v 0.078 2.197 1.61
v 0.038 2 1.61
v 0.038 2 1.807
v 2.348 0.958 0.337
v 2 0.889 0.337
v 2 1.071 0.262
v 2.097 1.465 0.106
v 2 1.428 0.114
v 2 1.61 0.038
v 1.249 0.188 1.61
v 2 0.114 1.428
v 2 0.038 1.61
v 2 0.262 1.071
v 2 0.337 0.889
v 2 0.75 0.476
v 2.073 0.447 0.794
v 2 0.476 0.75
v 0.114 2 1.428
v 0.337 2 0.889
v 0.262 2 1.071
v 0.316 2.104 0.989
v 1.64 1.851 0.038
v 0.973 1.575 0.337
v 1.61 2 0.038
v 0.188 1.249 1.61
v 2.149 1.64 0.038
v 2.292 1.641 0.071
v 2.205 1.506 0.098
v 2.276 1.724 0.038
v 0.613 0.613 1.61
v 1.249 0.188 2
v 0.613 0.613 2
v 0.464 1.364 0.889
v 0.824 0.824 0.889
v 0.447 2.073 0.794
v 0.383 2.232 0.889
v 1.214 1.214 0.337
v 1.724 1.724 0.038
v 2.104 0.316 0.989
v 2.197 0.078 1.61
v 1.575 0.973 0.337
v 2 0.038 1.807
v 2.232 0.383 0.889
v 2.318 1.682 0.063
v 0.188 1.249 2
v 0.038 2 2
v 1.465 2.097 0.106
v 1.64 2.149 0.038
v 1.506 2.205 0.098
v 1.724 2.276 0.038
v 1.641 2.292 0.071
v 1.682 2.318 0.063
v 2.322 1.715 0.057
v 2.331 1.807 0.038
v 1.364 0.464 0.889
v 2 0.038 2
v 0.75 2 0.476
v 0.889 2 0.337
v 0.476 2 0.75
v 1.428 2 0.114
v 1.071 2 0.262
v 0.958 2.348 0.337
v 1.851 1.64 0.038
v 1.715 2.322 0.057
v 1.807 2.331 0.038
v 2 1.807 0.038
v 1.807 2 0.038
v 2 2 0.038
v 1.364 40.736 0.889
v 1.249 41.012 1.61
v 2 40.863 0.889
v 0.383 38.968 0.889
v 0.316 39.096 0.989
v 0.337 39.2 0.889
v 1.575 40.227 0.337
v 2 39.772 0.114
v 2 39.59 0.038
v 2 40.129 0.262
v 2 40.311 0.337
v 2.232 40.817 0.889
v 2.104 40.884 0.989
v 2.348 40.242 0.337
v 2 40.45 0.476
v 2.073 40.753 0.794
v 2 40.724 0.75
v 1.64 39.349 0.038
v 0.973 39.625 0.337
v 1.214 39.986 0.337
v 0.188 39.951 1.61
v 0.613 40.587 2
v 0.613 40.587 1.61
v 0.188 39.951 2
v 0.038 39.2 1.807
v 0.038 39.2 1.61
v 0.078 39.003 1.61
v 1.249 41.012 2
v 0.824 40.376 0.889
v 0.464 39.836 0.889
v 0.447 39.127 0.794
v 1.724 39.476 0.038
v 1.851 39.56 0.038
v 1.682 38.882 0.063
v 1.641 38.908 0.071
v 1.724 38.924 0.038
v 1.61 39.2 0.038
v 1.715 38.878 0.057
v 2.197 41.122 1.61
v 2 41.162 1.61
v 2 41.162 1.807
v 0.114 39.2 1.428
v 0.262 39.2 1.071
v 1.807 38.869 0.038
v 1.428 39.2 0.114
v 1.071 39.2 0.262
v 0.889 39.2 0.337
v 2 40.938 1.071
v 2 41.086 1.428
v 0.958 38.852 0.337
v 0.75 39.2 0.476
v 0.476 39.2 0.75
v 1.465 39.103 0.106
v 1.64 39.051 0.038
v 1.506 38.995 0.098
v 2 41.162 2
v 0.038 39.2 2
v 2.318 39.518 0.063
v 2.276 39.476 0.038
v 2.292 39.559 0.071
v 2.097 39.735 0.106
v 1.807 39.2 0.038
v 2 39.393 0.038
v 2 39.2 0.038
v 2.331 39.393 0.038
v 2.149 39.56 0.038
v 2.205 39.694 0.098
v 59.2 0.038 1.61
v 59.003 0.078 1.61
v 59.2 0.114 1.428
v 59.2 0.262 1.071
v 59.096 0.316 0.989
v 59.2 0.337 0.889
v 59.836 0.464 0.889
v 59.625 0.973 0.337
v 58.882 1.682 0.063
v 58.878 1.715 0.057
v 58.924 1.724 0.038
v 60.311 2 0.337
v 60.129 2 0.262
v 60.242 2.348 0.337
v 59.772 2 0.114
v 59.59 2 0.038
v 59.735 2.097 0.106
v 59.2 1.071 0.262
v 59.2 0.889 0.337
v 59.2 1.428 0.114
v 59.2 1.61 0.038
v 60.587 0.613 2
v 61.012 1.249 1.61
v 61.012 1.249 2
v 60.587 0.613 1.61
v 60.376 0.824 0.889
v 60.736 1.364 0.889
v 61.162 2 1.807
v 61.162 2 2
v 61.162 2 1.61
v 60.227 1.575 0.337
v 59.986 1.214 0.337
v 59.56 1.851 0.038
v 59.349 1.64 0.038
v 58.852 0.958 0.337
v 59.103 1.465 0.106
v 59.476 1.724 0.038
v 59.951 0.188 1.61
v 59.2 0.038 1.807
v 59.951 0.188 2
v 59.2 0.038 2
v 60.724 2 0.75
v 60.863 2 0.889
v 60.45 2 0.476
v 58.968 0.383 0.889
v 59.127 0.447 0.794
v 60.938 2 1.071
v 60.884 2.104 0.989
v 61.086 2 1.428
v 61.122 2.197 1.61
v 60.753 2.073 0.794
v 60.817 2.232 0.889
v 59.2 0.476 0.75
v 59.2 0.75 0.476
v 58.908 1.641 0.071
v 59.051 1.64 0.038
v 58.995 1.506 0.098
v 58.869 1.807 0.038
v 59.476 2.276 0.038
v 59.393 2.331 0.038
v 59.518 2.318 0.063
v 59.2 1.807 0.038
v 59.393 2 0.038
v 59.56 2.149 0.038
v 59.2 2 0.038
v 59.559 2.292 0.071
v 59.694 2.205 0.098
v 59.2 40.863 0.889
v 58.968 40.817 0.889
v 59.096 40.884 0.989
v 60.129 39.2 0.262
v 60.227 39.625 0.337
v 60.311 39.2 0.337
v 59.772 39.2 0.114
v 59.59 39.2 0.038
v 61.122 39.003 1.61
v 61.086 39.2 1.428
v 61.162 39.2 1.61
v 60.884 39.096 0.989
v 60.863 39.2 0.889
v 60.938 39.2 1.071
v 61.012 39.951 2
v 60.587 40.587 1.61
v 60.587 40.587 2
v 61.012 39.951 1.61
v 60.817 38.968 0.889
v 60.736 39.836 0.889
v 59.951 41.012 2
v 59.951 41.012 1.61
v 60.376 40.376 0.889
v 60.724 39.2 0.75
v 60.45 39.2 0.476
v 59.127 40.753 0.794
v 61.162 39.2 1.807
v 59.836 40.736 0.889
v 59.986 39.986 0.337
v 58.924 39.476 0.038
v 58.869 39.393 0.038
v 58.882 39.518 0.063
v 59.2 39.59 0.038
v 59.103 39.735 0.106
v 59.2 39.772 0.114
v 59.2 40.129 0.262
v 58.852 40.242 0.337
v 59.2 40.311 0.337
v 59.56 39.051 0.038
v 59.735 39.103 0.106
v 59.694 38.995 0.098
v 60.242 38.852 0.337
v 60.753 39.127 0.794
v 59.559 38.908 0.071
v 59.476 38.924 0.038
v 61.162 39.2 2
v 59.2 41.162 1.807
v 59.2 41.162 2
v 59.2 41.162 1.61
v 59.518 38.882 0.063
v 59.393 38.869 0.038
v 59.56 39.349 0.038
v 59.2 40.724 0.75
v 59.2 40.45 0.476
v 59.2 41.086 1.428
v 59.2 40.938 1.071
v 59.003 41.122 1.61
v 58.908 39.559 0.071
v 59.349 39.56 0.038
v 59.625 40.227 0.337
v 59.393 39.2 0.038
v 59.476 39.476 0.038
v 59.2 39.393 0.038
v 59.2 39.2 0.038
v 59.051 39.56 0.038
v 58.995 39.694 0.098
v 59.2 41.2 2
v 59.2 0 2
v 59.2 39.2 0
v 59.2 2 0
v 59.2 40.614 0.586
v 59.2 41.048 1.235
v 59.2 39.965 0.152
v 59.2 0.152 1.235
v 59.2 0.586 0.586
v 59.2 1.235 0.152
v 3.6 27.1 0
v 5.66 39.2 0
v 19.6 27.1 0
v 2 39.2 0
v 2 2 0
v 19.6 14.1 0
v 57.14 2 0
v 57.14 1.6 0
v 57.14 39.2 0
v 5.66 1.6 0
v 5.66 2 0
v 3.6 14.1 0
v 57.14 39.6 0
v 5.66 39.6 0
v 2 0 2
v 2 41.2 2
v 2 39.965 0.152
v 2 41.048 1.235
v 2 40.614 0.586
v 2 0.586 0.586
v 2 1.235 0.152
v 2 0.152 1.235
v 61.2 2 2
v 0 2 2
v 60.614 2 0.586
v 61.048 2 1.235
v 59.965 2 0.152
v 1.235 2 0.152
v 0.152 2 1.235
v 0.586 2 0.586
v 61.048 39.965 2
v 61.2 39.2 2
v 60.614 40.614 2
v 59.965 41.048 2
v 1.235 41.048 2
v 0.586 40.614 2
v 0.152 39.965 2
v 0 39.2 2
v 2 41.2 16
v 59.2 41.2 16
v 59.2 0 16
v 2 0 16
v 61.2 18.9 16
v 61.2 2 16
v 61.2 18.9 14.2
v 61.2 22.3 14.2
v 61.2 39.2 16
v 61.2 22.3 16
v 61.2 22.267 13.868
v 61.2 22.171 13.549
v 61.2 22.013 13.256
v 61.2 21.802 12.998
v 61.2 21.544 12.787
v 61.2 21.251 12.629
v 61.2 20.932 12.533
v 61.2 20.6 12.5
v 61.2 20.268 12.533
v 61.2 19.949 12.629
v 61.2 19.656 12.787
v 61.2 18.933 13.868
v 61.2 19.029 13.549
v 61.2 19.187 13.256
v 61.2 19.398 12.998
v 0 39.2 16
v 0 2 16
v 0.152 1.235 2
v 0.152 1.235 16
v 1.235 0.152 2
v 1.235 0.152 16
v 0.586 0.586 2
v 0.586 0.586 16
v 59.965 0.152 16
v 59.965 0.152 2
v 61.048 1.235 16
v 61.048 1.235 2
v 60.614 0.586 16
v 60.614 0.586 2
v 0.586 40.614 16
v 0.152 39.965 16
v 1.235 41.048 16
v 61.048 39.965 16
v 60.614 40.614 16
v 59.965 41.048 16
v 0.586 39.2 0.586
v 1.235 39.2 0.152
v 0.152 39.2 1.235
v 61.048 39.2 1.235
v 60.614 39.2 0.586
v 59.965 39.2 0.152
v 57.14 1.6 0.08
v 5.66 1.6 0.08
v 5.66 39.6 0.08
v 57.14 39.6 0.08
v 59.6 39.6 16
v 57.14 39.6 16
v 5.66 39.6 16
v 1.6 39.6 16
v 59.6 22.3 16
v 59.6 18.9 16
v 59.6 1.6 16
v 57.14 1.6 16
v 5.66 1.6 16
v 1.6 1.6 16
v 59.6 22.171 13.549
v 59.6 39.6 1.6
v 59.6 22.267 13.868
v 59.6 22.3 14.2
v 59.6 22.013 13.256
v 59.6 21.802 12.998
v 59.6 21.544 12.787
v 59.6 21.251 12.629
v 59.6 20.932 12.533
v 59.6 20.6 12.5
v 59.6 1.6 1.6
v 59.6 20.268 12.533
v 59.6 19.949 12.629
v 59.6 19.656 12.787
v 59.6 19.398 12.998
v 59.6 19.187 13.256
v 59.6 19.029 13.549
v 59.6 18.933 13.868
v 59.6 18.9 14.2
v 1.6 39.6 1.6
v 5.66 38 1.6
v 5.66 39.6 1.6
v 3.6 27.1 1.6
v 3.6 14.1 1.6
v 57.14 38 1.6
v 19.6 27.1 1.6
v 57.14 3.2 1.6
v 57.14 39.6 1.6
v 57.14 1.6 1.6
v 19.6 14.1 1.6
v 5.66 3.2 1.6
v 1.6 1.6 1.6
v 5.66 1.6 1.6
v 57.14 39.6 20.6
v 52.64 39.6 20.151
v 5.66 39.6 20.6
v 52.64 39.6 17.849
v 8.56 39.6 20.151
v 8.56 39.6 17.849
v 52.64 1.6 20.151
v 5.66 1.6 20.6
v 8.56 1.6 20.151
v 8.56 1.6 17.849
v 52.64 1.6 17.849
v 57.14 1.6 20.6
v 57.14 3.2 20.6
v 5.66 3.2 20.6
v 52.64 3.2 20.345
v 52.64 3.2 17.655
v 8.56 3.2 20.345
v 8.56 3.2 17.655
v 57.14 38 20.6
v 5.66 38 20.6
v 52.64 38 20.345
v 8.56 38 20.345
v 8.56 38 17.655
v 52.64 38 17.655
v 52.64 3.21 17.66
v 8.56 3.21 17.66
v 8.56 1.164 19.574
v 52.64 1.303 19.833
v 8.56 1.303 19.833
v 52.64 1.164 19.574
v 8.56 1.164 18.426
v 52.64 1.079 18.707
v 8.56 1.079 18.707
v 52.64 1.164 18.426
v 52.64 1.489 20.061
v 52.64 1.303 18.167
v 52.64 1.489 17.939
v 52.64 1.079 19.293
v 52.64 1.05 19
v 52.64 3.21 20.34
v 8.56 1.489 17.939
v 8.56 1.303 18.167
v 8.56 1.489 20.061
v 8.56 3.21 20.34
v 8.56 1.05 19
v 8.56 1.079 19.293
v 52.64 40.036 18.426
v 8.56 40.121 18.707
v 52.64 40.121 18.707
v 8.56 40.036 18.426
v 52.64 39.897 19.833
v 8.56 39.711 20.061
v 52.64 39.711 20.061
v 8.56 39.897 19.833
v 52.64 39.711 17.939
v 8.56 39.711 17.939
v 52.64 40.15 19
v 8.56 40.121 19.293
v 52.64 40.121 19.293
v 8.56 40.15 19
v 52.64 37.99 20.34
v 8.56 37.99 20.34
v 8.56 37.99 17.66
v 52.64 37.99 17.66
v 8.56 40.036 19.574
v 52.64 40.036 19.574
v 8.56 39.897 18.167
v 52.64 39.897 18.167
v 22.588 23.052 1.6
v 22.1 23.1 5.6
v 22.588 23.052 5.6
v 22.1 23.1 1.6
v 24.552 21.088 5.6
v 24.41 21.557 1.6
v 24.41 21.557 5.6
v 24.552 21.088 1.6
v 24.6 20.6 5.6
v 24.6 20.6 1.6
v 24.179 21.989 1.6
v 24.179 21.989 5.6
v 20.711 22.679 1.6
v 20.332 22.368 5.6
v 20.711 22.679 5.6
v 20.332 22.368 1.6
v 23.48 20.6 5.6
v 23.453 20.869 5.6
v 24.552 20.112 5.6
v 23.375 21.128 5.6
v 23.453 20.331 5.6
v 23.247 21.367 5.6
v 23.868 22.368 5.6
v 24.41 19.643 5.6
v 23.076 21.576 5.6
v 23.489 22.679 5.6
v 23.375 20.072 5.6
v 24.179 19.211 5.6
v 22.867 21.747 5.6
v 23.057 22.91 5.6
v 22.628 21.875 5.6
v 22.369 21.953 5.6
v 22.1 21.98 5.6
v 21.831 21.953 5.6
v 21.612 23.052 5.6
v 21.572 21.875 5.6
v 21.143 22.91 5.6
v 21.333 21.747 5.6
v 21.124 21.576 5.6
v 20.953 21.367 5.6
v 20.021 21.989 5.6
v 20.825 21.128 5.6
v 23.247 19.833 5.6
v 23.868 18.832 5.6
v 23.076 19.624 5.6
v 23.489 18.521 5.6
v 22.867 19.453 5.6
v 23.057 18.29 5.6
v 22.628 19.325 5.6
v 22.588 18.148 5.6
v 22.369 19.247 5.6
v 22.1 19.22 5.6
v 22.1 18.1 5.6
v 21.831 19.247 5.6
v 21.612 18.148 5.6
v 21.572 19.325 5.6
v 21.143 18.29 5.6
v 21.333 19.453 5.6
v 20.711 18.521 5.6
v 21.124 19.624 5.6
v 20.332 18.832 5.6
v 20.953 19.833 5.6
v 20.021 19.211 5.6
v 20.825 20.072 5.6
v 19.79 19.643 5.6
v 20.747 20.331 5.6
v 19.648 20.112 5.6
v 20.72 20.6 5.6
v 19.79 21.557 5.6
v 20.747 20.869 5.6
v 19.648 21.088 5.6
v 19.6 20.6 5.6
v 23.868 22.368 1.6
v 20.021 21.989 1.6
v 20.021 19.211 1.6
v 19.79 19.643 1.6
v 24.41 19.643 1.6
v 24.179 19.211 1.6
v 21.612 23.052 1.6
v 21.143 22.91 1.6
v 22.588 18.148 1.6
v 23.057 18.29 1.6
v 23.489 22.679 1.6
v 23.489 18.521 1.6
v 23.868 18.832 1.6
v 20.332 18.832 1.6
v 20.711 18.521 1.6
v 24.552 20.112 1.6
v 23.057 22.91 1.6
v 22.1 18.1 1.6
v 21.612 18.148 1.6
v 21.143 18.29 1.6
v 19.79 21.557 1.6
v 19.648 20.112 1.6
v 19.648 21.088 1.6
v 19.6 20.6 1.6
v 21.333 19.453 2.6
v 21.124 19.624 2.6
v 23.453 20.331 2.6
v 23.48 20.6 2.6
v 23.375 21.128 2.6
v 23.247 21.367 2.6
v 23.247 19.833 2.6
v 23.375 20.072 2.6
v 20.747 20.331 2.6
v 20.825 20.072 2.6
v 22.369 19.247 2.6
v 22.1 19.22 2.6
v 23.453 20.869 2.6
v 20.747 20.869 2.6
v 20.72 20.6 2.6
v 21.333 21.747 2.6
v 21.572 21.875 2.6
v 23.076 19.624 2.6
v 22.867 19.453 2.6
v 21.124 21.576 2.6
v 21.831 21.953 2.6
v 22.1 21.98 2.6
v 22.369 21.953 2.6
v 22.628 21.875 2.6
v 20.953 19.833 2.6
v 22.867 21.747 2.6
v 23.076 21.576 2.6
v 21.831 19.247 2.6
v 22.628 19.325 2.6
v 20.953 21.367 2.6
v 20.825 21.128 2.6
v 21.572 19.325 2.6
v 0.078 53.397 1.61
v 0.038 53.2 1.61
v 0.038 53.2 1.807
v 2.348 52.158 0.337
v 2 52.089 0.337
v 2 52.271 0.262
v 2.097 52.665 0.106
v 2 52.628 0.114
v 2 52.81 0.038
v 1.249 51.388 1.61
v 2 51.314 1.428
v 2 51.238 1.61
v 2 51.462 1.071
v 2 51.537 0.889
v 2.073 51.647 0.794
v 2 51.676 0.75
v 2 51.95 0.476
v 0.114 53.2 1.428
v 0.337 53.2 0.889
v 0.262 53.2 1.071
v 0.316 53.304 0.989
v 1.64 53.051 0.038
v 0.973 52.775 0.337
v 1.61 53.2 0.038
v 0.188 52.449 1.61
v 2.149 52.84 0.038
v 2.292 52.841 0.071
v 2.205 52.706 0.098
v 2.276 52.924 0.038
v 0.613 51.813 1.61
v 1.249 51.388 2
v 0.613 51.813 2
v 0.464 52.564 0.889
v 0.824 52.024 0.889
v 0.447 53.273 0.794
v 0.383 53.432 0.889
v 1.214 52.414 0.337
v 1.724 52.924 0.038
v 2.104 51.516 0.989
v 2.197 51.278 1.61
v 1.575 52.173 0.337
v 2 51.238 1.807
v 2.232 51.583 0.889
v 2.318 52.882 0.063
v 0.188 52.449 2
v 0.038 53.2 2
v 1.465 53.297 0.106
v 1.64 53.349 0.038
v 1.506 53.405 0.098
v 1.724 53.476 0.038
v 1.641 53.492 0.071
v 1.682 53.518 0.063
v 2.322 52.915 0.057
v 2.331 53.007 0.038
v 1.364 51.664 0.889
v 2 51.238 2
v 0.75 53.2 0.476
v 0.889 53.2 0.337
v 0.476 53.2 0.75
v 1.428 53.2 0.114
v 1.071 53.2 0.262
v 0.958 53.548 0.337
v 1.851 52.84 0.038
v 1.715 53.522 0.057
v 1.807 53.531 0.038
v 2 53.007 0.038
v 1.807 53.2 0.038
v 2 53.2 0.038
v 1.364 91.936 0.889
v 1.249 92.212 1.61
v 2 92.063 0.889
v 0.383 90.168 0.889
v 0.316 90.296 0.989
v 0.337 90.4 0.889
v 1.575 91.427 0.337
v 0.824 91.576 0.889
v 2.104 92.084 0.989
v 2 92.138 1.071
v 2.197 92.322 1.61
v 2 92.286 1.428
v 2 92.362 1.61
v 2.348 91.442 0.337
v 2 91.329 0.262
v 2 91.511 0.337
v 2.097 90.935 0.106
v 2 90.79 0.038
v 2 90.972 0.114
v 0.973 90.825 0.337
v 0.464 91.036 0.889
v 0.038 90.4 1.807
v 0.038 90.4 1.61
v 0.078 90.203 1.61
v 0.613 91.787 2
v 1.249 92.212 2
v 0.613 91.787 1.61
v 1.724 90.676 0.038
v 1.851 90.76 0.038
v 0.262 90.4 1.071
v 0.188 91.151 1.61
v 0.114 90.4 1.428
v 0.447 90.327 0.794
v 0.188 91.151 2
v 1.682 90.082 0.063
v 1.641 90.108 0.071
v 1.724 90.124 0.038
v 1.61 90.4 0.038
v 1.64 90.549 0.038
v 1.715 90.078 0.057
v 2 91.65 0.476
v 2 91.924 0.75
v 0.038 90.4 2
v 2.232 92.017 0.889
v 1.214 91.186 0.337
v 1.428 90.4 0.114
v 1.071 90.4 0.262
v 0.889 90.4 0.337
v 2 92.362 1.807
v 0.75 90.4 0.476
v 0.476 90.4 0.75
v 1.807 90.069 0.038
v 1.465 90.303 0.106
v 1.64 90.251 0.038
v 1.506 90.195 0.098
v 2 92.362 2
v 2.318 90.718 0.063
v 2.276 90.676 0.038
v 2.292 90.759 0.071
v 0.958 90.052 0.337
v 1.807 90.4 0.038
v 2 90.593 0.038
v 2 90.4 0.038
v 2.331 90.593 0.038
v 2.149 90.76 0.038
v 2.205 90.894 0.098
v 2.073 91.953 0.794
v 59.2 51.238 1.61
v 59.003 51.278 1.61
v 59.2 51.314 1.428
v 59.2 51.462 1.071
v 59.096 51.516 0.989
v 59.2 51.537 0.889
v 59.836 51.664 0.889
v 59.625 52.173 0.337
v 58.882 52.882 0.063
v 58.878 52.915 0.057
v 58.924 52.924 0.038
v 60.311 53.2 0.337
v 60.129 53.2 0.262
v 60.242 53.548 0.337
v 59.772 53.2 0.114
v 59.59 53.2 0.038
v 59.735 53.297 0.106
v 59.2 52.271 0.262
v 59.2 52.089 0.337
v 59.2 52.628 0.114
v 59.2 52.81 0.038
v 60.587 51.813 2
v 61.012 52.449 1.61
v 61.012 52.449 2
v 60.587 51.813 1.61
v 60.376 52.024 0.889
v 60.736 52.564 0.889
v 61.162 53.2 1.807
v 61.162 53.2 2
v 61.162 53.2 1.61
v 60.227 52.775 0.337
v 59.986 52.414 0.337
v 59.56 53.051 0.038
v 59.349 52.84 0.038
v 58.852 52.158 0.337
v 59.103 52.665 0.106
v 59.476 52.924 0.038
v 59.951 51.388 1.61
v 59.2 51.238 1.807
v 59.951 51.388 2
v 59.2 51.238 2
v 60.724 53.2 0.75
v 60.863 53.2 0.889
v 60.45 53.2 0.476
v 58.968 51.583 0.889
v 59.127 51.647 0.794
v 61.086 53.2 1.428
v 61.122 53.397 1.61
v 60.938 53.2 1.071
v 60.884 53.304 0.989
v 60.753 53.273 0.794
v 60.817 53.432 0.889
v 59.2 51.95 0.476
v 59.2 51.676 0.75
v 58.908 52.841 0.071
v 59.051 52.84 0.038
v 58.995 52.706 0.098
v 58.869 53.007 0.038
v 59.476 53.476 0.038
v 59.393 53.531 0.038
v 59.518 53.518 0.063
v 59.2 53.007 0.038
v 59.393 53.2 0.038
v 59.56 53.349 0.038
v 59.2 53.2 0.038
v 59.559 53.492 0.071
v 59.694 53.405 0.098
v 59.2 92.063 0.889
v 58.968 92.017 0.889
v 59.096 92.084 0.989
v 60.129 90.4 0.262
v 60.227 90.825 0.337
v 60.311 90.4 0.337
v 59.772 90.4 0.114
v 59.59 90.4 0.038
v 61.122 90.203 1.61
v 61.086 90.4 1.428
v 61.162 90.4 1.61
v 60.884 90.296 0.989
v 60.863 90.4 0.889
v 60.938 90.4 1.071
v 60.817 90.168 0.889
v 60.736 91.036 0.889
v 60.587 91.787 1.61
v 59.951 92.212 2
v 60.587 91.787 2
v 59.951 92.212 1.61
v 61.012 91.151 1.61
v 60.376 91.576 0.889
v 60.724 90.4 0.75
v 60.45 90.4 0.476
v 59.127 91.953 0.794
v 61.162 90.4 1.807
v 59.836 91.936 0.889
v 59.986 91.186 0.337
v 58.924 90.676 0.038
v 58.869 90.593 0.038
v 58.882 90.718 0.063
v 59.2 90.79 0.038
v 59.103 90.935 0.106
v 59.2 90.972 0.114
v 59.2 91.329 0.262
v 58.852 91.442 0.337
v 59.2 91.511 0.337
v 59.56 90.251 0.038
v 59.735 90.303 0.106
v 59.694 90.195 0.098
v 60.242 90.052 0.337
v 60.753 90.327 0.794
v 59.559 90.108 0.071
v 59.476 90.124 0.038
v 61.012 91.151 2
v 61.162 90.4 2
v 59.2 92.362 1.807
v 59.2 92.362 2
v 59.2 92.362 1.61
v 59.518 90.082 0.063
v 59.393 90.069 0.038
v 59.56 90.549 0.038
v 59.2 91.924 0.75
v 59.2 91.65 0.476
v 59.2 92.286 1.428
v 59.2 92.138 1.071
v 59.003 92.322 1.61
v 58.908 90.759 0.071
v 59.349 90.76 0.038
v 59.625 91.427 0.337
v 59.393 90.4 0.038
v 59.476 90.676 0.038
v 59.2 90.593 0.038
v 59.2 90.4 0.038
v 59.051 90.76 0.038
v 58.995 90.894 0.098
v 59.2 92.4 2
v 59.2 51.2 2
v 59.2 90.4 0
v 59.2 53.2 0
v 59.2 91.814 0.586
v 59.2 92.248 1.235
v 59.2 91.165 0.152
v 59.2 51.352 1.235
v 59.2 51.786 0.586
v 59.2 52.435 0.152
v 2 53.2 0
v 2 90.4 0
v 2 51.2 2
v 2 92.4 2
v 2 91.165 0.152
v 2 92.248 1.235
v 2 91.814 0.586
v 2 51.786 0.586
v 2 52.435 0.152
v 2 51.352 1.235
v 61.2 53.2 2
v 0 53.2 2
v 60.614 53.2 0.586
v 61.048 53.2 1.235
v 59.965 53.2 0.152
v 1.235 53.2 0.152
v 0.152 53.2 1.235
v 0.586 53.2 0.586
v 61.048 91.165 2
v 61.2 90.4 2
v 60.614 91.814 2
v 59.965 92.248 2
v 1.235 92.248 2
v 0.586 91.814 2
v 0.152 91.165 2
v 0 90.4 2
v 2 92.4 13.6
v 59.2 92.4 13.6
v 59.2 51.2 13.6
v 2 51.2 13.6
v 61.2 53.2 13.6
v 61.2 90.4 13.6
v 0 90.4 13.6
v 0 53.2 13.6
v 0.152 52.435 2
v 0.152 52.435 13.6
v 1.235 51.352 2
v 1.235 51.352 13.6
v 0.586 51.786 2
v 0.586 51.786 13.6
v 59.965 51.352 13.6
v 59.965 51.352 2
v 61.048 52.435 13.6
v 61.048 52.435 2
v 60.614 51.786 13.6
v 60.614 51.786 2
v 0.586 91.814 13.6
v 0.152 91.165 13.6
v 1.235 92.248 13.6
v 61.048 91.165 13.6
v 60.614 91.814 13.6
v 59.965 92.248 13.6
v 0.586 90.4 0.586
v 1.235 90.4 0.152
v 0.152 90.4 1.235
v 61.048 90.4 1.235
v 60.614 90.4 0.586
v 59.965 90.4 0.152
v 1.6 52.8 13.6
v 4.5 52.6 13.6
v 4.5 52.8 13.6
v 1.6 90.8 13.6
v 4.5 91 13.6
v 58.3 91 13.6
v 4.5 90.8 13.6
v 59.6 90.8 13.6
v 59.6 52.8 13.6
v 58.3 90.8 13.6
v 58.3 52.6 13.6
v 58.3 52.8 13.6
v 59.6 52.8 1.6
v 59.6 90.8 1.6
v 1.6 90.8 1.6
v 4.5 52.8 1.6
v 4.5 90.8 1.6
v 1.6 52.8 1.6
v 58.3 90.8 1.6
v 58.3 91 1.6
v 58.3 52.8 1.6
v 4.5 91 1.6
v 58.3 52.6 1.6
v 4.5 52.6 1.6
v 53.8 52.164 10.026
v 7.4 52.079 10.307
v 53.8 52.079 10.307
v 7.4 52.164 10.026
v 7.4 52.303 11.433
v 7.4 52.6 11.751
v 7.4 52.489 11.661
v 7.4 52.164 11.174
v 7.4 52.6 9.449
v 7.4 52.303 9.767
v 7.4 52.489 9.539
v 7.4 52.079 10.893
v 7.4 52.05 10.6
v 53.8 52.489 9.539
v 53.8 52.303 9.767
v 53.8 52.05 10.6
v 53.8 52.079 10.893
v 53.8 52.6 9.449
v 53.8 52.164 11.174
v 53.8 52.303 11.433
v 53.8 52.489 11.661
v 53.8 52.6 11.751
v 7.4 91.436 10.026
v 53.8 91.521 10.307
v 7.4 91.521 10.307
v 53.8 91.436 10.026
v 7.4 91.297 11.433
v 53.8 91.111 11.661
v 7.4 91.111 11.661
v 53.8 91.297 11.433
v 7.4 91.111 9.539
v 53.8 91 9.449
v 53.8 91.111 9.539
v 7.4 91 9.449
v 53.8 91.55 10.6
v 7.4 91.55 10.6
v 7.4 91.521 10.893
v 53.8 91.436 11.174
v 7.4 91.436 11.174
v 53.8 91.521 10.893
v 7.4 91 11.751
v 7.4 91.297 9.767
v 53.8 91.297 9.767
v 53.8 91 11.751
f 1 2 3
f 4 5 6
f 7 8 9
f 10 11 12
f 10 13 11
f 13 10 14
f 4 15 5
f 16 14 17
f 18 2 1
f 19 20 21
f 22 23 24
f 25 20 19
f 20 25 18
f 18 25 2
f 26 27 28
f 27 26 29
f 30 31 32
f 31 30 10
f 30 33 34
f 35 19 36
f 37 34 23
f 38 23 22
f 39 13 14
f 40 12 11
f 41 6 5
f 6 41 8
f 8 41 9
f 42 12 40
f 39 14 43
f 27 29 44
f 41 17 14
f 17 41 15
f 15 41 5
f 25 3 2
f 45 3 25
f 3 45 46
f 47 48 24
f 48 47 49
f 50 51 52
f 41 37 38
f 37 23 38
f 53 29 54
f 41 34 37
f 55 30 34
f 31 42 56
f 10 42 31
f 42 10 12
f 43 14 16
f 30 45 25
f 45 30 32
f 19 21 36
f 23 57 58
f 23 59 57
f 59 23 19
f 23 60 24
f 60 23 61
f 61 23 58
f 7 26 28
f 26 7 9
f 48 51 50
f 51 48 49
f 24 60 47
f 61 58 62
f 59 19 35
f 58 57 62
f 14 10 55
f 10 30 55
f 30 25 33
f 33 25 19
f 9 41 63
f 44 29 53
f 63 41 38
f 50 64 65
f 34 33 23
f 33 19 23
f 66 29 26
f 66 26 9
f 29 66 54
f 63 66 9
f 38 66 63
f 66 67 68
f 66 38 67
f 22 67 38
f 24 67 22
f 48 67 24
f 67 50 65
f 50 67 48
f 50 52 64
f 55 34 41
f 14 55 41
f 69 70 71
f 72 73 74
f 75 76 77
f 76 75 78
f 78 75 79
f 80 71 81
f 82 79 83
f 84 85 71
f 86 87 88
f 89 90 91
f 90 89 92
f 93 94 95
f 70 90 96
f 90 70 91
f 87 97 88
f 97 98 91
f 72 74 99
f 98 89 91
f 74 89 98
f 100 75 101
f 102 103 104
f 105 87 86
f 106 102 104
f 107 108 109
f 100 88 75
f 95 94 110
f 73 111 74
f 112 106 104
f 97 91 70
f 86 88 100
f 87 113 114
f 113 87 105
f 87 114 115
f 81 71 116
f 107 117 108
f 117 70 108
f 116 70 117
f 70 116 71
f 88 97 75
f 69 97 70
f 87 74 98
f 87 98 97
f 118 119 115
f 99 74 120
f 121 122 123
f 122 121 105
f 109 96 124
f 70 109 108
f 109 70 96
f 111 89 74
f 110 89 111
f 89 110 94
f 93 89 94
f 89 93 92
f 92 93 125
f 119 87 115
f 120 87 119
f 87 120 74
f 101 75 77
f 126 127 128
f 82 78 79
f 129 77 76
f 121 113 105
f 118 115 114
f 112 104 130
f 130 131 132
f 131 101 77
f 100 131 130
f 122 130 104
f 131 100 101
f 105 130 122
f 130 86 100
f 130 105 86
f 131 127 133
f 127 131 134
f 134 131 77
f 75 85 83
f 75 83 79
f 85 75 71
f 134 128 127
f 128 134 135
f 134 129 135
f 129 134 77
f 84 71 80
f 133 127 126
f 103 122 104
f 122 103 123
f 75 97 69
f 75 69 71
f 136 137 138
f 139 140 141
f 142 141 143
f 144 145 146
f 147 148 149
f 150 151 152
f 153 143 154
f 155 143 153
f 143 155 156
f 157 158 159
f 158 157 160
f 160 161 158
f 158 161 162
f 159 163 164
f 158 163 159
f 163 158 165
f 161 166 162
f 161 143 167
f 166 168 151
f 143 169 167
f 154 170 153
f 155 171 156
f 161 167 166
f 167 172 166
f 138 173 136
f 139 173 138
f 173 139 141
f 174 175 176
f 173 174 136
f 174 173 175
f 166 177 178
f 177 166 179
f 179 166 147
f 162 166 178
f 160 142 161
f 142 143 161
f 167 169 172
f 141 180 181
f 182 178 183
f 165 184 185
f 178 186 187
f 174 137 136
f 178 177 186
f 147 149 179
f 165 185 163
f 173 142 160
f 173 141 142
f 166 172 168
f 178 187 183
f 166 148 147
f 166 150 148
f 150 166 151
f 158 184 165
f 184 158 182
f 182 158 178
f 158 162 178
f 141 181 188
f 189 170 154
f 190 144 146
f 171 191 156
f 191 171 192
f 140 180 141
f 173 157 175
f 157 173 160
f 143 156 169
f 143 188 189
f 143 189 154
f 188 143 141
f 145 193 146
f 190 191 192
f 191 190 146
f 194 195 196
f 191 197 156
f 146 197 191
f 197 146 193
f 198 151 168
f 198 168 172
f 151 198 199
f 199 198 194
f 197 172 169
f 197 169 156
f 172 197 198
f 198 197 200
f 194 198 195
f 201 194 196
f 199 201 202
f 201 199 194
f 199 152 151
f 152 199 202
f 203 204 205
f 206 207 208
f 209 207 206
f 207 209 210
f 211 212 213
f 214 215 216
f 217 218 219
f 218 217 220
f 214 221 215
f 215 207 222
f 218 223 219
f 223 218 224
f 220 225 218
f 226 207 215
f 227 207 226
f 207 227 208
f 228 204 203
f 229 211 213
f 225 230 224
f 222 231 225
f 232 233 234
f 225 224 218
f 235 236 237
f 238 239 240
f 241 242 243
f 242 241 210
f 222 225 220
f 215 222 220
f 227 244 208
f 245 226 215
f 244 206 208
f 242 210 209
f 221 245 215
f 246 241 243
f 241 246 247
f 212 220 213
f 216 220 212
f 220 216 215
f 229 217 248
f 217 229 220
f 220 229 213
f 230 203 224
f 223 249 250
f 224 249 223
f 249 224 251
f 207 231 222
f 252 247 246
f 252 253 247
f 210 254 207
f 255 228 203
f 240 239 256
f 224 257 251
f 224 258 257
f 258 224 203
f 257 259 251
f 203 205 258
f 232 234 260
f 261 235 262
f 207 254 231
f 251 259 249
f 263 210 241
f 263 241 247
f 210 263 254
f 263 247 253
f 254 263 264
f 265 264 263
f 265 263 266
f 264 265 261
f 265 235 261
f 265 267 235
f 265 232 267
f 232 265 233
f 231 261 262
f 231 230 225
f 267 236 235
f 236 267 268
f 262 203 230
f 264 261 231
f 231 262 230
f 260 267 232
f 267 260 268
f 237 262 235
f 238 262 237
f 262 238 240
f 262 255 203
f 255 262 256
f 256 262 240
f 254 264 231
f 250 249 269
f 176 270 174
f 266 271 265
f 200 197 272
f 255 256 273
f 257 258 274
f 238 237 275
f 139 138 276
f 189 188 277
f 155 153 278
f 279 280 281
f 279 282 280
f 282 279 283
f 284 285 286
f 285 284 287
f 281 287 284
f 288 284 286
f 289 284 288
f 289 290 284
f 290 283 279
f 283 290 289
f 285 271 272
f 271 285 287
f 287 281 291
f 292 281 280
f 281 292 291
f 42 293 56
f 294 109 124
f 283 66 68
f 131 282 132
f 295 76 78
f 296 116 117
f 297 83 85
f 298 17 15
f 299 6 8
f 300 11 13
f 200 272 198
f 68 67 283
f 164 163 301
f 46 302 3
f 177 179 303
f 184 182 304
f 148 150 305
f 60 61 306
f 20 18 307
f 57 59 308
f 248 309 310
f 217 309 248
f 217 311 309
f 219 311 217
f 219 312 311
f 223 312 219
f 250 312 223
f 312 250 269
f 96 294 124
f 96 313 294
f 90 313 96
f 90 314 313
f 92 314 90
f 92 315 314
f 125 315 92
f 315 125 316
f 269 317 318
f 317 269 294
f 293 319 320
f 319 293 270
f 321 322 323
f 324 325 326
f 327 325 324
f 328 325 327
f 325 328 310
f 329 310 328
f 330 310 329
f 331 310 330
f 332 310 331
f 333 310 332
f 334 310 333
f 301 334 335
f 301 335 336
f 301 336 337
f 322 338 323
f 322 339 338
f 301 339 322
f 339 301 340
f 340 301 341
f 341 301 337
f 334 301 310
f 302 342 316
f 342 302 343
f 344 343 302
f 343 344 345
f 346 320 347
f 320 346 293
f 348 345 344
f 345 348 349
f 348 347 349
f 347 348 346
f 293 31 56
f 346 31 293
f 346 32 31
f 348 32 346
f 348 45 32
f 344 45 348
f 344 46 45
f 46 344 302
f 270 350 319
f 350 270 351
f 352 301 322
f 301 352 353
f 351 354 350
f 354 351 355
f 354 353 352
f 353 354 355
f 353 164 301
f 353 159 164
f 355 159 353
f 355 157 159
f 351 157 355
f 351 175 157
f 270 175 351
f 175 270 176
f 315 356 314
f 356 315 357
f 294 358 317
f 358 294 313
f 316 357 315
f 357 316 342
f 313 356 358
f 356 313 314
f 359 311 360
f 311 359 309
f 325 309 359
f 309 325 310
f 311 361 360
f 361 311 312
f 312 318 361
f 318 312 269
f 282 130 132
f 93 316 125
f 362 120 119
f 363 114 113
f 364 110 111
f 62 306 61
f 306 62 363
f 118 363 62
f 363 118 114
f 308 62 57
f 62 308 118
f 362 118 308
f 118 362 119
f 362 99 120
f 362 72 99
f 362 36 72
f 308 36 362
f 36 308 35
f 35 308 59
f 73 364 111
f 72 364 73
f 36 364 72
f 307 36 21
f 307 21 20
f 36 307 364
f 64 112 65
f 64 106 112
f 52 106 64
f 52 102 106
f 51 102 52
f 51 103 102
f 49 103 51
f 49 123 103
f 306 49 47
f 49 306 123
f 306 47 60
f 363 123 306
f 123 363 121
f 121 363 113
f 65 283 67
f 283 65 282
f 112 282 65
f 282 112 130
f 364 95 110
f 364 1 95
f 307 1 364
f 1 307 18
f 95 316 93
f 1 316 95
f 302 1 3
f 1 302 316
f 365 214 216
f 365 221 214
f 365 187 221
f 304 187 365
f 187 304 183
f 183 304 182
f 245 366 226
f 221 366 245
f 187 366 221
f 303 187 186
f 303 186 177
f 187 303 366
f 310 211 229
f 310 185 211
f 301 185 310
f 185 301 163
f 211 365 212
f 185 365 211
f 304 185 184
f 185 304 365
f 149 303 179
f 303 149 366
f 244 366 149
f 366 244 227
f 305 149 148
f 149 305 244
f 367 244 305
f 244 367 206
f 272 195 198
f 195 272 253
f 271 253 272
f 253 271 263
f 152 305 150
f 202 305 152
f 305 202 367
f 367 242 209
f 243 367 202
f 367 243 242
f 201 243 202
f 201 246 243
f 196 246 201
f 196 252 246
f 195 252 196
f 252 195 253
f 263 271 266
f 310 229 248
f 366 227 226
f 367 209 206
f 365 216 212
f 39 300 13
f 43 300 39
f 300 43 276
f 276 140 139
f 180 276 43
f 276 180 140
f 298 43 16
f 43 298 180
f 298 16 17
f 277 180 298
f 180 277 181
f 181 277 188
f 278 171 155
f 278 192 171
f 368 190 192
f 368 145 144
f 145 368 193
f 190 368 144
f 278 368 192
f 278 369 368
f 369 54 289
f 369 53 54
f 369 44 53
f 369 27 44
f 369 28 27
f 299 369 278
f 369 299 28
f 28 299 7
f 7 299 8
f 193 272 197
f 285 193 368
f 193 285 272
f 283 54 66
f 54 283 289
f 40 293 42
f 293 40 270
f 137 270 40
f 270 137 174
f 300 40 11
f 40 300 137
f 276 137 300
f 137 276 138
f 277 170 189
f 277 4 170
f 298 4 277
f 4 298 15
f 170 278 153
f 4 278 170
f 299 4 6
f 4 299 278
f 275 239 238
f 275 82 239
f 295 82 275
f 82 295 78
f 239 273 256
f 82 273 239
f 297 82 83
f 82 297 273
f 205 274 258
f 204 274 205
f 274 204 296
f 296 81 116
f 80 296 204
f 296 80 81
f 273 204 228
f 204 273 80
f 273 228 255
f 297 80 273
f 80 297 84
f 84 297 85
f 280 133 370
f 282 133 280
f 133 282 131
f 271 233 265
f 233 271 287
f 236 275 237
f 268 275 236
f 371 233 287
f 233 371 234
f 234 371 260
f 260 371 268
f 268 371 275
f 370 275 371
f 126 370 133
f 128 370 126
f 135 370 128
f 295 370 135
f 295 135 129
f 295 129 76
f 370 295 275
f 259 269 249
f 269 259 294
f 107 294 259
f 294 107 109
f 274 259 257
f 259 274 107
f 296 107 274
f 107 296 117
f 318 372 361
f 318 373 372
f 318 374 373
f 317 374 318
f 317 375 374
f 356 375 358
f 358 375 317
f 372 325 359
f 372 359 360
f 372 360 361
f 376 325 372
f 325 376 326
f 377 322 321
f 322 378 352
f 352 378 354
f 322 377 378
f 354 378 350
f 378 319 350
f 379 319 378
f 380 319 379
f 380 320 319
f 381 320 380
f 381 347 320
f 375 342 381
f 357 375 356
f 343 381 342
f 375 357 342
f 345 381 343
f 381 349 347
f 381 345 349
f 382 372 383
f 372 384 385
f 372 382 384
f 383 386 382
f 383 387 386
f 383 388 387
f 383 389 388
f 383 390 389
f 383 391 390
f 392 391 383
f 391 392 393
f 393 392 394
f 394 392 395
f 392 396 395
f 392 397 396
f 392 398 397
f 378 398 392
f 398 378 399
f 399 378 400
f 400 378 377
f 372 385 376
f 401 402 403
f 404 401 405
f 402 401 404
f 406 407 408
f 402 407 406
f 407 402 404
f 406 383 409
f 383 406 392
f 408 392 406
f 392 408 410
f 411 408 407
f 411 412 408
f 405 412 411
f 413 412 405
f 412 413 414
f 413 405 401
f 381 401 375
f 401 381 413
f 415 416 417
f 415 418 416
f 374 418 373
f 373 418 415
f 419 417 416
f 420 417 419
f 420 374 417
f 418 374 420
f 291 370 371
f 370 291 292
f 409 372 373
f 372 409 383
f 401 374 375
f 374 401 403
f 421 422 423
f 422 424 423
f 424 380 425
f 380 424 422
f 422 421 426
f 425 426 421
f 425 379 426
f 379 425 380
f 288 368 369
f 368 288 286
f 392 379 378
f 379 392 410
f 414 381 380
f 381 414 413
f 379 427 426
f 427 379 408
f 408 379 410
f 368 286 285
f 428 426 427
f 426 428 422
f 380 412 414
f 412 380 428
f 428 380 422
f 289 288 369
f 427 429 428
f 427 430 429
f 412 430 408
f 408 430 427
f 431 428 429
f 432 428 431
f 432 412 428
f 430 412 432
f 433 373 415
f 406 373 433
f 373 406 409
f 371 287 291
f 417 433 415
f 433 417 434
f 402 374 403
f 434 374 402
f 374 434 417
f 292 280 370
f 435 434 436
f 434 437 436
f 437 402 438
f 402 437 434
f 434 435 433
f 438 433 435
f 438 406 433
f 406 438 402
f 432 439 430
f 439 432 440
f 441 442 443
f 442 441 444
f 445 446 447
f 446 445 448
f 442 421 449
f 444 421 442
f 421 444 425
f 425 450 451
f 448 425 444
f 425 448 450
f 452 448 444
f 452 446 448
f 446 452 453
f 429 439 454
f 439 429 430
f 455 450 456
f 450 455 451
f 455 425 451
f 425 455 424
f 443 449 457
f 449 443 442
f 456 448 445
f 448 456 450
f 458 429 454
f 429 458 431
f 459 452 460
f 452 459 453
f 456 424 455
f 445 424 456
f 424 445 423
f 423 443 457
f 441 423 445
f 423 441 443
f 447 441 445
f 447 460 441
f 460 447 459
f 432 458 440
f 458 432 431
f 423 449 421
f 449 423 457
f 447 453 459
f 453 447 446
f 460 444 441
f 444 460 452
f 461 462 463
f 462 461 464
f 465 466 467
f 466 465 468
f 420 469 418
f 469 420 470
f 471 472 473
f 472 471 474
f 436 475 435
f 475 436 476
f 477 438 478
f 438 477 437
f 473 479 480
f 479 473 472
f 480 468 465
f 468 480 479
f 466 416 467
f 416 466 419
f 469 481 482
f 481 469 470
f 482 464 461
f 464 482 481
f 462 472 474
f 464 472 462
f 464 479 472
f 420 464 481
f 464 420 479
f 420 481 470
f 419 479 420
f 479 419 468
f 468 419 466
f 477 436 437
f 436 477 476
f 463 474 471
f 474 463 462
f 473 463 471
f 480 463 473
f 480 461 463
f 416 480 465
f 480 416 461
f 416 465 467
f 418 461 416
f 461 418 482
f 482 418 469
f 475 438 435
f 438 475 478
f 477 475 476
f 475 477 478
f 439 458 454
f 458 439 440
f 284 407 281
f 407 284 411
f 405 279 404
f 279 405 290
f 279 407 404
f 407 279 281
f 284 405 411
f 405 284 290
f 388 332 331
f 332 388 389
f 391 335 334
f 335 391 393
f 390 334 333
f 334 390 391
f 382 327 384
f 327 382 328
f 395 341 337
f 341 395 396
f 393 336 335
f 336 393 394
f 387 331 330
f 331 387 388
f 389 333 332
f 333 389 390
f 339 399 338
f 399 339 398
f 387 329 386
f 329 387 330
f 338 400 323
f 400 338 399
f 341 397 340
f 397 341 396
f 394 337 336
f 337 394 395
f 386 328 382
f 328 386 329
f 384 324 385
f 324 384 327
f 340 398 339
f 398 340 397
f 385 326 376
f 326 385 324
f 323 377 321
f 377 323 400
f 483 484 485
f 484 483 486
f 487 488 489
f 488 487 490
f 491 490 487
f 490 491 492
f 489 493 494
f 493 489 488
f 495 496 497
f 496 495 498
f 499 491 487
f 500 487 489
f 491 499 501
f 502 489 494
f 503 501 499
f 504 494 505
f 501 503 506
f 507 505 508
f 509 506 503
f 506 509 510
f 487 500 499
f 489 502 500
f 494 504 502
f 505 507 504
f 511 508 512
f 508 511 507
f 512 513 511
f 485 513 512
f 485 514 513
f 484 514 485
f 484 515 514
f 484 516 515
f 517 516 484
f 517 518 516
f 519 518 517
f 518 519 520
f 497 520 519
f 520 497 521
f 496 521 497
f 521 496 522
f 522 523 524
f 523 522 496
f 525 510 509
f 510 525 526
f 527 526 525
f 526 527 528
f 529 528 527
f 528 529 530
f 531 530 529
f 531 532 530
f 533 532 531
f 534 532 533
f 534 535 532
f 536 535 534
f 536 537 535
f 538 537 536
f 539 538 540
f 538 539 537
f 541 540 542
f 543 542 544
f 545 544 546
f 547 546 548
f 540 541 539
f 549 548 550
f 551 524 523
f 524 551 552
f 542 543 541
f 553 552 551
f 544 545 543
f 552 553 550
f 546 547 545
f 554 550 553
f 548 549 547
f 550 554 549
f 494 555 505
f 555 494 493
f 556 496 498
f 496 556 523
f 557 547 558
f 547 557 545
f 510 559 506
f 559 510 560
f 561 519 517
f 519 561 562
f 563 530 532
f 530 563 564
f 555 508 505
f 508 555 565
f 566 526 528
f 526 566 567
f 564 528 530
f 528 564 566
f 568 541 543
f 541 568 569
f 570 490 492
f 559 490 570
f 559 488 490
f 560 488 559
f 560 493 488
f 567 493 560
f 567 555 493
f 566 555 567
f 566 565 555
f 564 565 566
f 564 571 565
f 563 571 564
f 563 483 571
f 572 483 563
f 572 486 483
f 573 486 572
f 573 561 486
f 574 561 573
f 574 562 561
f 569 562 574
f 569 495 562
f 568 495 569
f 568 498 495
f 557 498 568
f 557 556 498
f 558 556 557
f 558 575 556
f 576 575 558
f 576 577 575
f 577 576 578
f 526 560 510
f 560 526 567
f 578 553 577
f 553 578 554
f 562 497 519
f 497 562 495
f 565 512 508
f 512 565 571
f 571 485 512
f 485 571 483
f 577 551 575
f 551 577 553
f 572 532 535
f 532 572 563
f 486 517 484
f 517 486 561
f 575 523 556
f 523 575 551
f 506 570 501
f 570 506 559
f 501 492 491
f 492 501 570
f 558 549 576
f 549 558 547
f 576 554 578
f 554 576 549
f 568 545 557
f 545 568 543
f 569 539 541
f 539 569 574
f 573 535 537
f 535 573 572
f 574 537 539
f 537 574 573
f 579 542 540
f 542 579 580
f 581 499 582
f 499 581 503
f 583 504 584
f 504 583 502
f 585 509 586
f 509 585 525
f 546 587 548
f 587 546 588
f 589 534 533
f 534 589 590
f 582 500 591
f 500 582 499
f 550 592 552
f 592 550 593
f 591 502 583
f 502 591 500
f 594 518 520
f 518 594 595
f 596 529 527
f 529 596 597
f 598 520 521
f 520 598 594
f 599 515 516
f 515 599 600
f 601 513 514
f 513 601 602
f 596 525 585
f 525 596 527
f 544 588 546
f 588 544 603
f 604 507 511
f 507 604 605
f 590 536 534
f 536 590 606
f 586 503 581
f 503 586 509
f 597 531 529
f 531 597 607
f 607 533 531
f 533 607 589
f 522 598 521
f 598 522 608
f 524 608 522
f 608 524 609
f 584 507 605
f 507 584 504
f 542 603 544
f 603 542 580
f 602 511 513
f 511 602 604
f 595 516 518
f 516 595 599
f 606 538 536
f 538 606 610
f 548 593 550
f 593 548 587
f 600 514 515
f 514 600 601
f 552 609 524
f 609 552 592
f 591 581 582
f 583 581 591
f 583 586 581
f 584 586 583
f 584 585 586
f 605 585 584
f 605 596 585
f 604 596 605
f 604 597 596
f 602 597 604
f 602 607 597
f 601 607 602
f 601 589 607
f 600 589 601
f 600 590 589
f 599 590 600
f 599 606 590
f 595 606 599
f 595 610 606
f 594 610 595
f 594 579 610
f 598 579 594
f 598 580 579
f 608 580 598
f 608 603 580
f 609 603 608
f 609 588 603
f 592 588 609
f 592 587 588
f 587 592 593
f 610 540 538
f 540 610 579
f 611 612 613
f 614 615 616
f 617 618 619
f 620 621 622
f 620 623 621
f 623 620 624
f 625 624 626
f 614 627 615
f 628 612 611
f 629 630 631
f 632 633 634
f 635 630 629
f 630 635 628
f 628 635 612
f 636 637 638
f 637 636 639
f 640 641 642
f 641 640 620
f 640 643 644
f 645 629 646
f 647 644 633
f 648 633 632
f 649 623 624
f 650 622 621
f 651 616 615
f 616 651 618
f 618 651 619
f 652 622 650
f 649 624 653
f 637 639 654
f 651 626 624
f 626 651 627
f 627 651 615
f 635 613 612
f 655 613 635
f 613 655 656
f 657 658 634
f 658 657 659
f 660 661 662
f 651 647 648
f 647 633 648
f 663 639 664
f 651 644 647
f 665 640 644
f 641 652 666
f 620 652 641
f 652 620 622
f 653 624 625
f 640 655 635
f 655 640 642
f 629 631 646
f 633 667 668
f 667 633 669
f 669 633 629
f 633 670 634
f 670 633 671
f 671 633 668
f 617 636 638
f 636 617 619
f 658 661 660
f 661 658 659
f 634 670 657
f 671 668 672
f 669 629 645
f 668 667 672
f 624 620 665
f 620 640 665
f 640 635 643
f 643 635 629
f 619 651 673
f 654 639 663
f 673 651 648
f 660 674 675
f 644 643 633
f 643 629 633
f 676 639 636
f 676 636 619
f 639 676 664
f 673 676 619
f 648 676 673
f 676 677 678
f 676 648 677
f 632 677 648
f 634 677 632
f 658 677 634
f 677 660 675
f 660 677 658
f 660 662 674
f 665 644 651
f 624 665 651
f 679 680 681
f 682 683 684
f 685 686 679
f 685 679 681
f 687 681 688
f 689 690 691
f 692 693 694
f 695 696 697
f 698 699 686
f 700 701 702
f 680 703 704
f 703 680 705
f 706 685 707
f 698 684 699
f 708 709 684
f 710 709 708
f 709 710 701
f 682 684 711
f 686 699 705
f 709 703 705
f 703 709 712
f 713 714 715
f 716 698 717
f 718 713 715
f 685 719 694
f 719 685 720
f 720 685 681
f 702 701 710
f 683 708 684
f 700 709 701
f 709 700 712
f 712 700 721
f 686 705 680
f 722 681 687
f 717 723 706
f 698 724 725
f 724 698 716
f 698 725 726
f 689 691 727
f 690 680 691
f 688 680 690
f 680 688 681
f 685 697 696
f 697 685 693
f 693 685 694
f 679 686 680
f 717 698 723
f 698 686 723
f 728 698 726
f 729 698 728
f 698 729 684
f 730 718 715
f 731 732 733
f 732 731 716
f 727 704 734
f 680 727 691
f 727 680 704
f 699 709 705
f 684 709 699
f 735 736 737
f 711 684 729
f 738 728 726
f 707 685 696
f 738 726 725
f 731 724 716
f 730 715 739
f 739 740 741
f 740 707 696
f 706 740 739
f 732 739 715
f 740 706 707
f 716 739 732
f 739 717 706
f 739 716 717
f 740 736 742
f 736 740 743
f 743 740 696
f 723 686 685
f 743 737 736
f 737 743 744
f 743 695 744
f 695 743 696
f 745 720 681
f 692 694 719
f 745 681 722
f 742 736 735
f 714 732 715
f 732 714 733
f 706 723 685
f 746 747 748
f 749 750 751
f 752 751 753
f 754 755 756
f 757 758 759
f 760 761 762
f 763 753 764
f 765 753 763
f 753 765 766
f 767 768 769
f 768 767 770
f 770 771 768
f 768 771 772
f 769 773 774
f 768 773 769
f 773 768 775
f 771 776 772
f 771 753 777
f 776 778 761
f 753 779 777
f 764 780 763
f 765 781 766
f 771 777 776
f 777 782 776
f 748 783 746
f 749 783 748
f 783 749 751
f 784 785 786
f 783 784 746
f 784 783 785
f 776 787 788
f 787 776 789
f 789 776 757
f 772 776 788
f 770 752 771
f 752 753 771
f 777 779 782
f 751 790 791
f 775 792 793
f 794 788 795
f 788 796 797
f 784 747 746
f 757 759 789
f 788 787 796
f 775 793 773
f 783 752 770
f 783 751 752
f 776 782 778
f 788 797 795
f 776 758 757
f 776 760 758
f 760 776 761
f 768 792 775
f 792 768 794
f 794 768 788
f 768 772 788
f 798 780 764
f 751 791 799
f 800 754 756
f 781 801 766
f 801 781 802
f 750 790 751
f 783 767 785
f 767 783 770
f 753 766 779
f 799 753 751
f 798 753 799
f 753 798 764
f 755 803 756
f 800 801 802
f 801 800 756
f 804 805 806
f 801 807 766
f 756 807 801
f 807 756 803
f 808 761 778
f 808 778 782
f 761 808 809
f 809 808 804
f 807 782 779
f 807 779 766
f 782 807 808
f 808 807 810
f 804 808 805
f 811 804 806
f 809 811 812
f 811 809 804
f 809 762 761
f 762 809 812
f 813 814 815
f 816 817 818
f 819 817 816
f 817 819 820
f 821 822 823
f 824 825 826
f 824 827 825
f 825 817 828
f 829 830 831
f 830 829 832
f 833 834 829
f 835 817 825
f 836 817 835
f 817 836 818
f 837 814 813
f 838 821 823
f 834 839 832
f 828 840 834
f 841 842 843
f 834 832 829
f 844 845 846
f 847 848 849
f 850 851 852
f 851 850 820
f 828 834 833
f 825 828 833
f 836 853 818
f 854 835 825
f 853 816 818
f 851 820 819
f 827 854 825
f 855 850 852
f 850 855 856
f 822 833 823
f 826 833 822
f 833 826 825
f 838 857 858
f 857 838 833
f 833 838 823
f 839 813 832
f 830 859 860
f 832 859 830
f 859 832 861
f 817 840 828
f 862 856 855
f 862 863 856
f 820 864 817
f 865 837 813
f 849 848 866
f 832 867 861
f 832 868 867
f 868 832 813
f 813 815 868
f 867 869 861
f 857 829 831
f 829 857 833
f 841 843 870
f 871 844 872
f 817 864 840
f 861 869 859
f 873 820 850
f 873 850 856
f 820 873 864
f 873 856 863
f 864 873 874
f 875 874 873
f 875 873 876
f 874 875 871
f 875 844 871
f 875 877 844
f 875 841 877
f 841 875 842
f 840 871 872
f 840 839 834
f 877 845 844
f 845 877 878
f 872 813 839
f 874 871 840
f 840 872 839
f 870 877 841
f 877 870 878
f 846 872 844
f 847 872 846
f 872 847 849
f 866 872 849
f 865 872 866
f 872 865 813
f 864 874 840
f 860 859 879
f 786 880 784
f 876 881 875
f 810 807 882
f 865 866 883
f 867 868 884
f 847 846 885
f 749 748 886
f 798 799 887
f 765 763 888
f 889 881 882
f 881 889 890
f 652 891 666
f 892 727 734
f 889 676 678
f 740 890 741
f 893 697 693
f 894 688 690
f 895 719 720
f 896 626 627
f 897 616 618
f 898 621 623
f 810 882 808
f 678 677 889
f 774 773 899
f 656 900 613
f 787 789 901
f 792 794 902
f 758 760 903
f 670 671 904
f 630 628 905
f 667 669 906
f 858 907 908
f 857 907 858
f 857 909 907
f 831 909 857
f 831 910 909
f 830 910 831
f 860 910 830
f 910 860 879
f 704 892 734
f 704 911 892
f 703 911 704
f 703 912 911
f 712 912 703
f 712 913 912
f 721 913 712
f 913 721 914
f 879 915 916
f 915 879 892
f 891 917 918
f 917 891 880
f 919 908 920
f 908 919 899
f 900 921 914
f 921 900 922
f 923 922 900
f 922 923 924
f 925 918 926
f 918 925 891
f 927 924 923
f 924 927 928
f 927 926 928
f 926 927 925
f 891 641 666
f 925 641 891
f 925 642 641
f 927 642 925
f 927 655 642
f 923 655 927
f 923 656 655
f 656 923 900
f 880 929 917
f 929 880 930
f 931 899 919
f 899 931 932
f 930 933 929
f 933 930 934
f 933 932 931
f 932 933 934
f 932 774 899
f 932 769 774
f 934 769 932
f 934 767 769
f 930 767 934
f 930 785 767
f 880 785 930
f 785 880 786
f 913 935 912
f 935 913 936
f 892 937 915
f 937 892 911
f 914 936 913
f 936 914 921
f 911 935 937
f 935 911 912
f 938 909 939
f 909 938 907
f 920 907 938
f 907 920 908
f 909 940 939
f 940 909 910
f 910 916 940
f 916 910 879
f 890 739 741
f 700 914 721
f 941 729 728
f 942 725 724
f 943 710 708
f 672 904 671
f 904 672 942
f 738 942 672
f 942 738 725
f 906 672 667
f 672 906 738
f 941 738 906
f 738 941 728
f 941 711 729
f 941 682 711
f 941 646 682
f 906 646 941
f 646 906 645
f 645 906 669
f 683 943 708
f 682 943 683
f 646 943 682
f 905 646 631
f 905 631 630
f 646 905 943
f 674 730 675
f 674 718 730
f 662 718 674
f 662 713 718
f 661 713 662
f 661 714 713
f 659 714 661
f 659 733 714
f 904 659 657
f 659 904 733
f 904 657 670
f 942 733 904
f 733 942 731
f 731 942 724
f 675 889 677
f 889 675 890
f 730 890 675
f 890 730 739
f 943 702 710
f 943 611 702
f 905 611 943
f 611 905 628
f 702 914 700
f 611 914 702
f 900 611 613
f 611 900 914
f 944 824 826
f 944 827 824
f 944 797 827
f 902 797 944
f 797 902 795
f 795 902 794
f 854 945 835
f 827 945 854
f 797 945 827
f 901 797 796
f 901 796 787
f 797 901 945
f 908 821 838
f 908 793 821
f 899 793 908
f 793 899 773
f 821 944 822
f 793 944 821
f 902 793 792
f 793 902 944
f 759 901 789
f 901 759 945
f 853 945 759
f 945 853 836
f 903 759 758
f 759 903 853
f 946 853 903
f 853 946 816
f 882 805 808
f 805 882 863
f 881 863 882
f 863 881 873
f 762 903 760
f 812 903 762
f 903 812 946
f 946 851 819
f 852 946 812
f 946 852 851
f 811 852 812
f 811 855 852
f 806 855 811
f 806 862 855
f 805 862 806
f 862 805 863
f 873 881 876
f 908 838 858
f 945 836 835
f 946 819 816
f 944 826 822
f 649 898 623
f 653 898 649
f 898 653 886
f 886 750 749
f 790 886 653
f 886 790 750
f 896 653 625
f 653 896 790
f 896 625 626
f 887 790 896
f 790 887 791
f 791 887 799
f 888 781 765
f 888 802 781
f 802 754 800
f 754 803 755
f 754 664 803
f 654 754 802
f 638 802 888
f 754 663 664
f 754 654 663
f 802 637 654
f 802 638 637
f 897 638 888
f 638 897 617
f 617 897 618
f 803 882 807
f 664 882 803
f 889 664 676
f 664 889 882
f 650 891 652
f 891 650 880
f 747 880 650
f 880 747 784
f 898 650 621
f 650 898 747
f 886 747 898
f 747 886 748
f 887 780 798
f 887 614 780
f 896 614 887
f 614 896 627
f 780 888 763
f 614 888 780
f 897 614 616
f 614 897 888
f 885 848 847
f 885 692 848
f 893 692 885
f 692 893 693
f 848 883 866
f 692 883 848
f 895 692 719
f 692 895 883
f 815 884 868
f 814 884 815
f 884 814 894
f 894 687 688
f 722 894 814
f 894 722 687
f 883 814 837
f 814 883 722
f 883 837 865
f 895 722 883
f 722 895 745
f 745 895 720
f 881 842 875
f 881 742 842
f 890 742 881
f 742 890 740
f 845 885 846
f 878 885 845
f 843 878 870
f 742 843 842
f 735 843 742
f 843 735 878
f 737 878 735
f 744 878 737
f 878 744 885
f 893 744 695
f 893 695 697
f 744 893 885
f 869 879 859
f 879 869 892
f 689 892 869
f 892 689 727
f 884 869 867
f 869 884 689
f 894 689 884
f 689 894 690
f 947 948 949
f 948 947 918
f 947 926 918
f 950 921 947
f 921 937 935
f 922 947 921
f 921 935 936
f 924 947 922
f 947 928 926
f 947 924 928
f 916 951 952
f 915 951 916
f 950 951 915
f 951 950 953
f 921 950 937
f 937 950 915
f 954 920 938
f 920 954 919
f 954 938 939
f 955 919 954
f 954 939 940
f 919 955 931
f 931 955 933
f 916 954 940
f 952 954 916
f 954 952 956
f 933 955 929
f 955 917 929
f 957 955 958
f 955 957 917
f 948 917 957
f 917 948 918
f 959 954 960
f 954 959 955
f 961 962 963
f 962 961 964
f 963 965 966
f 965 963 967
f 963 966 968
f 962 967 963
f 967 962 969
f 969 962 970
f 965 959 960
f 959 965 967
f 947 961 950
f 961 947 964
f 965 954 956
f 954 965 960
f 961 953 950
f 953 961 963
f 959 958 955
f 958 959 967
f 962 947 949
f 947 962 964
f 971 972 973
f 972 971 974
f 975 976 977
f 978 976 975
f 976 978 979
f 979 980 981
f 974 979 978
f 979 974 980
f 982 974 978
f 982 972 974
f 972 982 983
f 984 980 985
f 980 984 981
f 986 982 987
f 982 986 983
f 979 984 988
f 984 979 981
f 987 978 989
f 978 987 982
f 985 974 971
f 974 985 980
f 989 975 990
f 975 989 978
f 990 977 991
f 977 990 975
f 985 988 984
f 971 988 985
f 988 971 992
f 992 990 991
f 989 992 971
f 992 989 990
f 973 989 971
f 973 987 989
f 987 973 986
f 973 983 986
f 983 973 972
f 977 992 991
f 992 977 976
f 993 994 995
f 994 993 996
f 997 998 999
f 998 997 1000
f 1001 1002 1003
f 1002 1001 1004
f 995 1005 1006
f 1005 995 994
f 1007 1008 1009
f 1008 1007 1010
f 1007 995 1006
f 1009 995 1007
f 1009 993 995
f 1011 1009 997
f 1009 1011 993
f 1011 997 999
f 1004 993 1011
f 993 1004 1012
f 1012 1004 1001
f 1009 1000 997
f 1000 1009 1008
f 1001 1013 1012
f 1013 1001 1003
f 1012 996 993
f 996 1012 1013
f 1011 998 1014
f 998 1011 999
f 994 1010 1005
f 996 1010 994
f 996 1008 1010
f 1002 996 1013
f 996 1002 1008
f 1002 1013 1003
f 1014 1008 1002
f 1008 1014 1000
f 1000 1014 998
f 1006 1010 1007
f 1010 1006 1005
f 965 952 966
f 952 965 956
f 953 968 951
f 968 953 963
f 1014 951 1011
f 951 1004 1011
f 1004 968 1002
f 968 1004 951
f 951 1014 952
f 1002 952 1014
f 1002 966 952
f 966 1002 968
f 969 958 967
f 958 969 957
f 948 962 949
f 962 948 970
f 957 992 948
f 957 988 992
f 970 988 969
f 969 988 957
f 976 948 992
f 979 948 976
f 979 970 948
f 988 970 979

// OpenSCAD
inner_dims = [58, 38];
sensor = [16,13];

wall = 1.6;
tabd = 3;
m3 = 2.76;
cord=3.4;


$fn=32;



top();
translate([0, inner_dims.y+wall*2+10,0]) bottom();

module top() {
    h=16;
    difference() {
        union() {
            case(h);
            translate([wall+inner_dims.x*0.07,wall,0]) cube([inner_dims.x*.86+wall,wall,wall+h+3]);
            translate([wall+inner_dims.x*0.07,inner_dims.y,0]) cube([inner_dims.x*.86+wall,wall,wall+h+3]);
            translate([inner_dims.x*.12+wall, wall+tabd/4+0.2, h+tabd]) rotate([0,90,0]) cylinder(h=inner_dims.x*.76, d=tabd);
            translate([inner_dims.x*.12+wall, wall+inner_dims.y-tabd/4-0.2, h+tabd]) rotate([0,90,0]) cylinder(h=inner_dims.x*.76, d=tabd);
        }
        
        // cut the cylinders for friction fit
        translate([wall, 2*wall+0.01, wall]) cube([inner_dims.x, inner_dims.y-2*wall-0.02, h*2]);
        
        // cut the sensor hole
        translate([wall+2,wall+inner_dims.y/2-sensor.y/2,-1]) cube([sensor.x, sensor.y, h]);

        //cut the cord hole
        translate([inner_dims.x,wall+inner_dims.y/2,h+wall-cord]) rotate([0,90,0]) cylinder(d=cord,h=wall*4);
        translate([inner_dims.x,wall+inner_dims.y/2-cord/2,h+wall]) rotate([0,90,0]) cube([cord,cord,wall*4]);
        
    }
    translate([wall+2+sensor.x+2.5,wall+inner_dims.y/2,wall]) post(5,m3, 4,3);
}


module bottom() {
    h = 12+wall;
    difference() {
        case(h);
        
        // snap fit grooves
        translate([inner_dims.x*.1+wall, wall+tabd/4, h-tabd]) rotate([0,90,0]) cylinder(h=inner_dims.x*.8, d=tabd);
        translate([inner_dims.x*.1+wall, wall+inner_dims.y-tabd/4, h-tabd]) rotate([0,90,0]) cylinder(h=inner_dims.x*.8, d=tabd);
        
        // shaving wall for tolerence 
        translate([wall+inner_dims.x*0.05,inner_dims.y+0.2,wall]) cube([inner_dims.x*.9+wall,wall,wall+h+3]);
        translate([wall+inner_dims.x*0.05,wall-0.2,wall]) cube([inner_dims.x*.9+wall,wall,wall+h+3]);

    }

}



module case(height, male=true) {
    union() {
        difference() {
            rcube([inner_dims.x + 2*wall, inner_dims.y + 2*wall, height+5], 2);
            translate([-0.01, -0.01, height]) cube([inner_dims.x + 2*wall+1, inner_dims.y + 2*wall+1, height]);
            translate([wall, wall, wall]) cube([inner_dims.x, inner_dims.y, height]);
        }
    }
}

module post(od, id, height, depth) {
    $fn = 32;
    difference() {
        cylinder(d=od, h=height);
        translate([0, 0, height - depth]) cylinder(d=id, h=depth+0.01);
    }
}

module rcube(dims_or_size, r, center = false) {
    $fn = 16;
    dims = (dims_or_size[0] == undef) ? [dims_or_size, dims_or_size, dims_or_size] : dims_or_size;
    translate(center ? [-dims.x/2, -dims.y/2, -dims.z/2] : [0,0,0]) 
    union() {
        // cubes in x,y,z directions for the middle
        translate([r,r,0]) cube([dims.x - 2*r, dims.y - 2*r, dims.z]); 
        translate([r,0,r]) cube([dims.x - 2*r, dims.y, dims.z - 2*r]);
        translate([0,r,r]) cube([dims.x, dims.y - 2*r, dims.z - 2*r]);
        
        // cylinders for the vertices
        translate([r,r,r]) cylinder(dims.z - 2*r, r = r);
        translate([dims.x-r,r,r]) cylinder(dims.z - 2*r, r = r);
        translate([r,dims.y-r,r]) cylinder(dims.z - 2*r, r = r);
        translate([dims.x-r,dims.y-r,r]) cylinder(dims.z - 2*r, r = r);
        
        translate([r,r,r]) rotate([-90,0,0]) cylinder(dims.y - 2*r, r = r);
        translate([dims.x-r,r,r]) rotate([-90,0,0]) cylinder(dims.y - 2*r, r = r);
        translate([r,r,dims.z-r]) rotate([-90,0,0]) cylinder(dims.y - 2*r, r = r);
        translate([dims.x-r,r,dims.z-r]) rotate([-90,0,0]) cylinder(dims.y - 2*r, r = r);
        
        translate([r,r,r]) rotate([0,90,0]) cylinder(dims.x - 2*r, r = r);
        translate([r,r,dims.z-r]) rotate([0,90,0]) cylinder(dims.x - 2*r, r = r);
        translate([r,dims.y-r,r]) rotate([0,90,0]) cylinder(dims.x - 2*r, r = r);
        translate([r,dims.y-r,dims.z-r]) rotate([0,90,0]) cylinder(dims.x - 2*r, r = r);

        // spheres for the corners
        for (x = [r, dims.x - r]) {
            for (y = [r, dims.y - r]) {
                for (z = [r, dims.z - r]) {
                    translate([x,y,z]) sphere(r);
                }
            }
        }
    }
}
